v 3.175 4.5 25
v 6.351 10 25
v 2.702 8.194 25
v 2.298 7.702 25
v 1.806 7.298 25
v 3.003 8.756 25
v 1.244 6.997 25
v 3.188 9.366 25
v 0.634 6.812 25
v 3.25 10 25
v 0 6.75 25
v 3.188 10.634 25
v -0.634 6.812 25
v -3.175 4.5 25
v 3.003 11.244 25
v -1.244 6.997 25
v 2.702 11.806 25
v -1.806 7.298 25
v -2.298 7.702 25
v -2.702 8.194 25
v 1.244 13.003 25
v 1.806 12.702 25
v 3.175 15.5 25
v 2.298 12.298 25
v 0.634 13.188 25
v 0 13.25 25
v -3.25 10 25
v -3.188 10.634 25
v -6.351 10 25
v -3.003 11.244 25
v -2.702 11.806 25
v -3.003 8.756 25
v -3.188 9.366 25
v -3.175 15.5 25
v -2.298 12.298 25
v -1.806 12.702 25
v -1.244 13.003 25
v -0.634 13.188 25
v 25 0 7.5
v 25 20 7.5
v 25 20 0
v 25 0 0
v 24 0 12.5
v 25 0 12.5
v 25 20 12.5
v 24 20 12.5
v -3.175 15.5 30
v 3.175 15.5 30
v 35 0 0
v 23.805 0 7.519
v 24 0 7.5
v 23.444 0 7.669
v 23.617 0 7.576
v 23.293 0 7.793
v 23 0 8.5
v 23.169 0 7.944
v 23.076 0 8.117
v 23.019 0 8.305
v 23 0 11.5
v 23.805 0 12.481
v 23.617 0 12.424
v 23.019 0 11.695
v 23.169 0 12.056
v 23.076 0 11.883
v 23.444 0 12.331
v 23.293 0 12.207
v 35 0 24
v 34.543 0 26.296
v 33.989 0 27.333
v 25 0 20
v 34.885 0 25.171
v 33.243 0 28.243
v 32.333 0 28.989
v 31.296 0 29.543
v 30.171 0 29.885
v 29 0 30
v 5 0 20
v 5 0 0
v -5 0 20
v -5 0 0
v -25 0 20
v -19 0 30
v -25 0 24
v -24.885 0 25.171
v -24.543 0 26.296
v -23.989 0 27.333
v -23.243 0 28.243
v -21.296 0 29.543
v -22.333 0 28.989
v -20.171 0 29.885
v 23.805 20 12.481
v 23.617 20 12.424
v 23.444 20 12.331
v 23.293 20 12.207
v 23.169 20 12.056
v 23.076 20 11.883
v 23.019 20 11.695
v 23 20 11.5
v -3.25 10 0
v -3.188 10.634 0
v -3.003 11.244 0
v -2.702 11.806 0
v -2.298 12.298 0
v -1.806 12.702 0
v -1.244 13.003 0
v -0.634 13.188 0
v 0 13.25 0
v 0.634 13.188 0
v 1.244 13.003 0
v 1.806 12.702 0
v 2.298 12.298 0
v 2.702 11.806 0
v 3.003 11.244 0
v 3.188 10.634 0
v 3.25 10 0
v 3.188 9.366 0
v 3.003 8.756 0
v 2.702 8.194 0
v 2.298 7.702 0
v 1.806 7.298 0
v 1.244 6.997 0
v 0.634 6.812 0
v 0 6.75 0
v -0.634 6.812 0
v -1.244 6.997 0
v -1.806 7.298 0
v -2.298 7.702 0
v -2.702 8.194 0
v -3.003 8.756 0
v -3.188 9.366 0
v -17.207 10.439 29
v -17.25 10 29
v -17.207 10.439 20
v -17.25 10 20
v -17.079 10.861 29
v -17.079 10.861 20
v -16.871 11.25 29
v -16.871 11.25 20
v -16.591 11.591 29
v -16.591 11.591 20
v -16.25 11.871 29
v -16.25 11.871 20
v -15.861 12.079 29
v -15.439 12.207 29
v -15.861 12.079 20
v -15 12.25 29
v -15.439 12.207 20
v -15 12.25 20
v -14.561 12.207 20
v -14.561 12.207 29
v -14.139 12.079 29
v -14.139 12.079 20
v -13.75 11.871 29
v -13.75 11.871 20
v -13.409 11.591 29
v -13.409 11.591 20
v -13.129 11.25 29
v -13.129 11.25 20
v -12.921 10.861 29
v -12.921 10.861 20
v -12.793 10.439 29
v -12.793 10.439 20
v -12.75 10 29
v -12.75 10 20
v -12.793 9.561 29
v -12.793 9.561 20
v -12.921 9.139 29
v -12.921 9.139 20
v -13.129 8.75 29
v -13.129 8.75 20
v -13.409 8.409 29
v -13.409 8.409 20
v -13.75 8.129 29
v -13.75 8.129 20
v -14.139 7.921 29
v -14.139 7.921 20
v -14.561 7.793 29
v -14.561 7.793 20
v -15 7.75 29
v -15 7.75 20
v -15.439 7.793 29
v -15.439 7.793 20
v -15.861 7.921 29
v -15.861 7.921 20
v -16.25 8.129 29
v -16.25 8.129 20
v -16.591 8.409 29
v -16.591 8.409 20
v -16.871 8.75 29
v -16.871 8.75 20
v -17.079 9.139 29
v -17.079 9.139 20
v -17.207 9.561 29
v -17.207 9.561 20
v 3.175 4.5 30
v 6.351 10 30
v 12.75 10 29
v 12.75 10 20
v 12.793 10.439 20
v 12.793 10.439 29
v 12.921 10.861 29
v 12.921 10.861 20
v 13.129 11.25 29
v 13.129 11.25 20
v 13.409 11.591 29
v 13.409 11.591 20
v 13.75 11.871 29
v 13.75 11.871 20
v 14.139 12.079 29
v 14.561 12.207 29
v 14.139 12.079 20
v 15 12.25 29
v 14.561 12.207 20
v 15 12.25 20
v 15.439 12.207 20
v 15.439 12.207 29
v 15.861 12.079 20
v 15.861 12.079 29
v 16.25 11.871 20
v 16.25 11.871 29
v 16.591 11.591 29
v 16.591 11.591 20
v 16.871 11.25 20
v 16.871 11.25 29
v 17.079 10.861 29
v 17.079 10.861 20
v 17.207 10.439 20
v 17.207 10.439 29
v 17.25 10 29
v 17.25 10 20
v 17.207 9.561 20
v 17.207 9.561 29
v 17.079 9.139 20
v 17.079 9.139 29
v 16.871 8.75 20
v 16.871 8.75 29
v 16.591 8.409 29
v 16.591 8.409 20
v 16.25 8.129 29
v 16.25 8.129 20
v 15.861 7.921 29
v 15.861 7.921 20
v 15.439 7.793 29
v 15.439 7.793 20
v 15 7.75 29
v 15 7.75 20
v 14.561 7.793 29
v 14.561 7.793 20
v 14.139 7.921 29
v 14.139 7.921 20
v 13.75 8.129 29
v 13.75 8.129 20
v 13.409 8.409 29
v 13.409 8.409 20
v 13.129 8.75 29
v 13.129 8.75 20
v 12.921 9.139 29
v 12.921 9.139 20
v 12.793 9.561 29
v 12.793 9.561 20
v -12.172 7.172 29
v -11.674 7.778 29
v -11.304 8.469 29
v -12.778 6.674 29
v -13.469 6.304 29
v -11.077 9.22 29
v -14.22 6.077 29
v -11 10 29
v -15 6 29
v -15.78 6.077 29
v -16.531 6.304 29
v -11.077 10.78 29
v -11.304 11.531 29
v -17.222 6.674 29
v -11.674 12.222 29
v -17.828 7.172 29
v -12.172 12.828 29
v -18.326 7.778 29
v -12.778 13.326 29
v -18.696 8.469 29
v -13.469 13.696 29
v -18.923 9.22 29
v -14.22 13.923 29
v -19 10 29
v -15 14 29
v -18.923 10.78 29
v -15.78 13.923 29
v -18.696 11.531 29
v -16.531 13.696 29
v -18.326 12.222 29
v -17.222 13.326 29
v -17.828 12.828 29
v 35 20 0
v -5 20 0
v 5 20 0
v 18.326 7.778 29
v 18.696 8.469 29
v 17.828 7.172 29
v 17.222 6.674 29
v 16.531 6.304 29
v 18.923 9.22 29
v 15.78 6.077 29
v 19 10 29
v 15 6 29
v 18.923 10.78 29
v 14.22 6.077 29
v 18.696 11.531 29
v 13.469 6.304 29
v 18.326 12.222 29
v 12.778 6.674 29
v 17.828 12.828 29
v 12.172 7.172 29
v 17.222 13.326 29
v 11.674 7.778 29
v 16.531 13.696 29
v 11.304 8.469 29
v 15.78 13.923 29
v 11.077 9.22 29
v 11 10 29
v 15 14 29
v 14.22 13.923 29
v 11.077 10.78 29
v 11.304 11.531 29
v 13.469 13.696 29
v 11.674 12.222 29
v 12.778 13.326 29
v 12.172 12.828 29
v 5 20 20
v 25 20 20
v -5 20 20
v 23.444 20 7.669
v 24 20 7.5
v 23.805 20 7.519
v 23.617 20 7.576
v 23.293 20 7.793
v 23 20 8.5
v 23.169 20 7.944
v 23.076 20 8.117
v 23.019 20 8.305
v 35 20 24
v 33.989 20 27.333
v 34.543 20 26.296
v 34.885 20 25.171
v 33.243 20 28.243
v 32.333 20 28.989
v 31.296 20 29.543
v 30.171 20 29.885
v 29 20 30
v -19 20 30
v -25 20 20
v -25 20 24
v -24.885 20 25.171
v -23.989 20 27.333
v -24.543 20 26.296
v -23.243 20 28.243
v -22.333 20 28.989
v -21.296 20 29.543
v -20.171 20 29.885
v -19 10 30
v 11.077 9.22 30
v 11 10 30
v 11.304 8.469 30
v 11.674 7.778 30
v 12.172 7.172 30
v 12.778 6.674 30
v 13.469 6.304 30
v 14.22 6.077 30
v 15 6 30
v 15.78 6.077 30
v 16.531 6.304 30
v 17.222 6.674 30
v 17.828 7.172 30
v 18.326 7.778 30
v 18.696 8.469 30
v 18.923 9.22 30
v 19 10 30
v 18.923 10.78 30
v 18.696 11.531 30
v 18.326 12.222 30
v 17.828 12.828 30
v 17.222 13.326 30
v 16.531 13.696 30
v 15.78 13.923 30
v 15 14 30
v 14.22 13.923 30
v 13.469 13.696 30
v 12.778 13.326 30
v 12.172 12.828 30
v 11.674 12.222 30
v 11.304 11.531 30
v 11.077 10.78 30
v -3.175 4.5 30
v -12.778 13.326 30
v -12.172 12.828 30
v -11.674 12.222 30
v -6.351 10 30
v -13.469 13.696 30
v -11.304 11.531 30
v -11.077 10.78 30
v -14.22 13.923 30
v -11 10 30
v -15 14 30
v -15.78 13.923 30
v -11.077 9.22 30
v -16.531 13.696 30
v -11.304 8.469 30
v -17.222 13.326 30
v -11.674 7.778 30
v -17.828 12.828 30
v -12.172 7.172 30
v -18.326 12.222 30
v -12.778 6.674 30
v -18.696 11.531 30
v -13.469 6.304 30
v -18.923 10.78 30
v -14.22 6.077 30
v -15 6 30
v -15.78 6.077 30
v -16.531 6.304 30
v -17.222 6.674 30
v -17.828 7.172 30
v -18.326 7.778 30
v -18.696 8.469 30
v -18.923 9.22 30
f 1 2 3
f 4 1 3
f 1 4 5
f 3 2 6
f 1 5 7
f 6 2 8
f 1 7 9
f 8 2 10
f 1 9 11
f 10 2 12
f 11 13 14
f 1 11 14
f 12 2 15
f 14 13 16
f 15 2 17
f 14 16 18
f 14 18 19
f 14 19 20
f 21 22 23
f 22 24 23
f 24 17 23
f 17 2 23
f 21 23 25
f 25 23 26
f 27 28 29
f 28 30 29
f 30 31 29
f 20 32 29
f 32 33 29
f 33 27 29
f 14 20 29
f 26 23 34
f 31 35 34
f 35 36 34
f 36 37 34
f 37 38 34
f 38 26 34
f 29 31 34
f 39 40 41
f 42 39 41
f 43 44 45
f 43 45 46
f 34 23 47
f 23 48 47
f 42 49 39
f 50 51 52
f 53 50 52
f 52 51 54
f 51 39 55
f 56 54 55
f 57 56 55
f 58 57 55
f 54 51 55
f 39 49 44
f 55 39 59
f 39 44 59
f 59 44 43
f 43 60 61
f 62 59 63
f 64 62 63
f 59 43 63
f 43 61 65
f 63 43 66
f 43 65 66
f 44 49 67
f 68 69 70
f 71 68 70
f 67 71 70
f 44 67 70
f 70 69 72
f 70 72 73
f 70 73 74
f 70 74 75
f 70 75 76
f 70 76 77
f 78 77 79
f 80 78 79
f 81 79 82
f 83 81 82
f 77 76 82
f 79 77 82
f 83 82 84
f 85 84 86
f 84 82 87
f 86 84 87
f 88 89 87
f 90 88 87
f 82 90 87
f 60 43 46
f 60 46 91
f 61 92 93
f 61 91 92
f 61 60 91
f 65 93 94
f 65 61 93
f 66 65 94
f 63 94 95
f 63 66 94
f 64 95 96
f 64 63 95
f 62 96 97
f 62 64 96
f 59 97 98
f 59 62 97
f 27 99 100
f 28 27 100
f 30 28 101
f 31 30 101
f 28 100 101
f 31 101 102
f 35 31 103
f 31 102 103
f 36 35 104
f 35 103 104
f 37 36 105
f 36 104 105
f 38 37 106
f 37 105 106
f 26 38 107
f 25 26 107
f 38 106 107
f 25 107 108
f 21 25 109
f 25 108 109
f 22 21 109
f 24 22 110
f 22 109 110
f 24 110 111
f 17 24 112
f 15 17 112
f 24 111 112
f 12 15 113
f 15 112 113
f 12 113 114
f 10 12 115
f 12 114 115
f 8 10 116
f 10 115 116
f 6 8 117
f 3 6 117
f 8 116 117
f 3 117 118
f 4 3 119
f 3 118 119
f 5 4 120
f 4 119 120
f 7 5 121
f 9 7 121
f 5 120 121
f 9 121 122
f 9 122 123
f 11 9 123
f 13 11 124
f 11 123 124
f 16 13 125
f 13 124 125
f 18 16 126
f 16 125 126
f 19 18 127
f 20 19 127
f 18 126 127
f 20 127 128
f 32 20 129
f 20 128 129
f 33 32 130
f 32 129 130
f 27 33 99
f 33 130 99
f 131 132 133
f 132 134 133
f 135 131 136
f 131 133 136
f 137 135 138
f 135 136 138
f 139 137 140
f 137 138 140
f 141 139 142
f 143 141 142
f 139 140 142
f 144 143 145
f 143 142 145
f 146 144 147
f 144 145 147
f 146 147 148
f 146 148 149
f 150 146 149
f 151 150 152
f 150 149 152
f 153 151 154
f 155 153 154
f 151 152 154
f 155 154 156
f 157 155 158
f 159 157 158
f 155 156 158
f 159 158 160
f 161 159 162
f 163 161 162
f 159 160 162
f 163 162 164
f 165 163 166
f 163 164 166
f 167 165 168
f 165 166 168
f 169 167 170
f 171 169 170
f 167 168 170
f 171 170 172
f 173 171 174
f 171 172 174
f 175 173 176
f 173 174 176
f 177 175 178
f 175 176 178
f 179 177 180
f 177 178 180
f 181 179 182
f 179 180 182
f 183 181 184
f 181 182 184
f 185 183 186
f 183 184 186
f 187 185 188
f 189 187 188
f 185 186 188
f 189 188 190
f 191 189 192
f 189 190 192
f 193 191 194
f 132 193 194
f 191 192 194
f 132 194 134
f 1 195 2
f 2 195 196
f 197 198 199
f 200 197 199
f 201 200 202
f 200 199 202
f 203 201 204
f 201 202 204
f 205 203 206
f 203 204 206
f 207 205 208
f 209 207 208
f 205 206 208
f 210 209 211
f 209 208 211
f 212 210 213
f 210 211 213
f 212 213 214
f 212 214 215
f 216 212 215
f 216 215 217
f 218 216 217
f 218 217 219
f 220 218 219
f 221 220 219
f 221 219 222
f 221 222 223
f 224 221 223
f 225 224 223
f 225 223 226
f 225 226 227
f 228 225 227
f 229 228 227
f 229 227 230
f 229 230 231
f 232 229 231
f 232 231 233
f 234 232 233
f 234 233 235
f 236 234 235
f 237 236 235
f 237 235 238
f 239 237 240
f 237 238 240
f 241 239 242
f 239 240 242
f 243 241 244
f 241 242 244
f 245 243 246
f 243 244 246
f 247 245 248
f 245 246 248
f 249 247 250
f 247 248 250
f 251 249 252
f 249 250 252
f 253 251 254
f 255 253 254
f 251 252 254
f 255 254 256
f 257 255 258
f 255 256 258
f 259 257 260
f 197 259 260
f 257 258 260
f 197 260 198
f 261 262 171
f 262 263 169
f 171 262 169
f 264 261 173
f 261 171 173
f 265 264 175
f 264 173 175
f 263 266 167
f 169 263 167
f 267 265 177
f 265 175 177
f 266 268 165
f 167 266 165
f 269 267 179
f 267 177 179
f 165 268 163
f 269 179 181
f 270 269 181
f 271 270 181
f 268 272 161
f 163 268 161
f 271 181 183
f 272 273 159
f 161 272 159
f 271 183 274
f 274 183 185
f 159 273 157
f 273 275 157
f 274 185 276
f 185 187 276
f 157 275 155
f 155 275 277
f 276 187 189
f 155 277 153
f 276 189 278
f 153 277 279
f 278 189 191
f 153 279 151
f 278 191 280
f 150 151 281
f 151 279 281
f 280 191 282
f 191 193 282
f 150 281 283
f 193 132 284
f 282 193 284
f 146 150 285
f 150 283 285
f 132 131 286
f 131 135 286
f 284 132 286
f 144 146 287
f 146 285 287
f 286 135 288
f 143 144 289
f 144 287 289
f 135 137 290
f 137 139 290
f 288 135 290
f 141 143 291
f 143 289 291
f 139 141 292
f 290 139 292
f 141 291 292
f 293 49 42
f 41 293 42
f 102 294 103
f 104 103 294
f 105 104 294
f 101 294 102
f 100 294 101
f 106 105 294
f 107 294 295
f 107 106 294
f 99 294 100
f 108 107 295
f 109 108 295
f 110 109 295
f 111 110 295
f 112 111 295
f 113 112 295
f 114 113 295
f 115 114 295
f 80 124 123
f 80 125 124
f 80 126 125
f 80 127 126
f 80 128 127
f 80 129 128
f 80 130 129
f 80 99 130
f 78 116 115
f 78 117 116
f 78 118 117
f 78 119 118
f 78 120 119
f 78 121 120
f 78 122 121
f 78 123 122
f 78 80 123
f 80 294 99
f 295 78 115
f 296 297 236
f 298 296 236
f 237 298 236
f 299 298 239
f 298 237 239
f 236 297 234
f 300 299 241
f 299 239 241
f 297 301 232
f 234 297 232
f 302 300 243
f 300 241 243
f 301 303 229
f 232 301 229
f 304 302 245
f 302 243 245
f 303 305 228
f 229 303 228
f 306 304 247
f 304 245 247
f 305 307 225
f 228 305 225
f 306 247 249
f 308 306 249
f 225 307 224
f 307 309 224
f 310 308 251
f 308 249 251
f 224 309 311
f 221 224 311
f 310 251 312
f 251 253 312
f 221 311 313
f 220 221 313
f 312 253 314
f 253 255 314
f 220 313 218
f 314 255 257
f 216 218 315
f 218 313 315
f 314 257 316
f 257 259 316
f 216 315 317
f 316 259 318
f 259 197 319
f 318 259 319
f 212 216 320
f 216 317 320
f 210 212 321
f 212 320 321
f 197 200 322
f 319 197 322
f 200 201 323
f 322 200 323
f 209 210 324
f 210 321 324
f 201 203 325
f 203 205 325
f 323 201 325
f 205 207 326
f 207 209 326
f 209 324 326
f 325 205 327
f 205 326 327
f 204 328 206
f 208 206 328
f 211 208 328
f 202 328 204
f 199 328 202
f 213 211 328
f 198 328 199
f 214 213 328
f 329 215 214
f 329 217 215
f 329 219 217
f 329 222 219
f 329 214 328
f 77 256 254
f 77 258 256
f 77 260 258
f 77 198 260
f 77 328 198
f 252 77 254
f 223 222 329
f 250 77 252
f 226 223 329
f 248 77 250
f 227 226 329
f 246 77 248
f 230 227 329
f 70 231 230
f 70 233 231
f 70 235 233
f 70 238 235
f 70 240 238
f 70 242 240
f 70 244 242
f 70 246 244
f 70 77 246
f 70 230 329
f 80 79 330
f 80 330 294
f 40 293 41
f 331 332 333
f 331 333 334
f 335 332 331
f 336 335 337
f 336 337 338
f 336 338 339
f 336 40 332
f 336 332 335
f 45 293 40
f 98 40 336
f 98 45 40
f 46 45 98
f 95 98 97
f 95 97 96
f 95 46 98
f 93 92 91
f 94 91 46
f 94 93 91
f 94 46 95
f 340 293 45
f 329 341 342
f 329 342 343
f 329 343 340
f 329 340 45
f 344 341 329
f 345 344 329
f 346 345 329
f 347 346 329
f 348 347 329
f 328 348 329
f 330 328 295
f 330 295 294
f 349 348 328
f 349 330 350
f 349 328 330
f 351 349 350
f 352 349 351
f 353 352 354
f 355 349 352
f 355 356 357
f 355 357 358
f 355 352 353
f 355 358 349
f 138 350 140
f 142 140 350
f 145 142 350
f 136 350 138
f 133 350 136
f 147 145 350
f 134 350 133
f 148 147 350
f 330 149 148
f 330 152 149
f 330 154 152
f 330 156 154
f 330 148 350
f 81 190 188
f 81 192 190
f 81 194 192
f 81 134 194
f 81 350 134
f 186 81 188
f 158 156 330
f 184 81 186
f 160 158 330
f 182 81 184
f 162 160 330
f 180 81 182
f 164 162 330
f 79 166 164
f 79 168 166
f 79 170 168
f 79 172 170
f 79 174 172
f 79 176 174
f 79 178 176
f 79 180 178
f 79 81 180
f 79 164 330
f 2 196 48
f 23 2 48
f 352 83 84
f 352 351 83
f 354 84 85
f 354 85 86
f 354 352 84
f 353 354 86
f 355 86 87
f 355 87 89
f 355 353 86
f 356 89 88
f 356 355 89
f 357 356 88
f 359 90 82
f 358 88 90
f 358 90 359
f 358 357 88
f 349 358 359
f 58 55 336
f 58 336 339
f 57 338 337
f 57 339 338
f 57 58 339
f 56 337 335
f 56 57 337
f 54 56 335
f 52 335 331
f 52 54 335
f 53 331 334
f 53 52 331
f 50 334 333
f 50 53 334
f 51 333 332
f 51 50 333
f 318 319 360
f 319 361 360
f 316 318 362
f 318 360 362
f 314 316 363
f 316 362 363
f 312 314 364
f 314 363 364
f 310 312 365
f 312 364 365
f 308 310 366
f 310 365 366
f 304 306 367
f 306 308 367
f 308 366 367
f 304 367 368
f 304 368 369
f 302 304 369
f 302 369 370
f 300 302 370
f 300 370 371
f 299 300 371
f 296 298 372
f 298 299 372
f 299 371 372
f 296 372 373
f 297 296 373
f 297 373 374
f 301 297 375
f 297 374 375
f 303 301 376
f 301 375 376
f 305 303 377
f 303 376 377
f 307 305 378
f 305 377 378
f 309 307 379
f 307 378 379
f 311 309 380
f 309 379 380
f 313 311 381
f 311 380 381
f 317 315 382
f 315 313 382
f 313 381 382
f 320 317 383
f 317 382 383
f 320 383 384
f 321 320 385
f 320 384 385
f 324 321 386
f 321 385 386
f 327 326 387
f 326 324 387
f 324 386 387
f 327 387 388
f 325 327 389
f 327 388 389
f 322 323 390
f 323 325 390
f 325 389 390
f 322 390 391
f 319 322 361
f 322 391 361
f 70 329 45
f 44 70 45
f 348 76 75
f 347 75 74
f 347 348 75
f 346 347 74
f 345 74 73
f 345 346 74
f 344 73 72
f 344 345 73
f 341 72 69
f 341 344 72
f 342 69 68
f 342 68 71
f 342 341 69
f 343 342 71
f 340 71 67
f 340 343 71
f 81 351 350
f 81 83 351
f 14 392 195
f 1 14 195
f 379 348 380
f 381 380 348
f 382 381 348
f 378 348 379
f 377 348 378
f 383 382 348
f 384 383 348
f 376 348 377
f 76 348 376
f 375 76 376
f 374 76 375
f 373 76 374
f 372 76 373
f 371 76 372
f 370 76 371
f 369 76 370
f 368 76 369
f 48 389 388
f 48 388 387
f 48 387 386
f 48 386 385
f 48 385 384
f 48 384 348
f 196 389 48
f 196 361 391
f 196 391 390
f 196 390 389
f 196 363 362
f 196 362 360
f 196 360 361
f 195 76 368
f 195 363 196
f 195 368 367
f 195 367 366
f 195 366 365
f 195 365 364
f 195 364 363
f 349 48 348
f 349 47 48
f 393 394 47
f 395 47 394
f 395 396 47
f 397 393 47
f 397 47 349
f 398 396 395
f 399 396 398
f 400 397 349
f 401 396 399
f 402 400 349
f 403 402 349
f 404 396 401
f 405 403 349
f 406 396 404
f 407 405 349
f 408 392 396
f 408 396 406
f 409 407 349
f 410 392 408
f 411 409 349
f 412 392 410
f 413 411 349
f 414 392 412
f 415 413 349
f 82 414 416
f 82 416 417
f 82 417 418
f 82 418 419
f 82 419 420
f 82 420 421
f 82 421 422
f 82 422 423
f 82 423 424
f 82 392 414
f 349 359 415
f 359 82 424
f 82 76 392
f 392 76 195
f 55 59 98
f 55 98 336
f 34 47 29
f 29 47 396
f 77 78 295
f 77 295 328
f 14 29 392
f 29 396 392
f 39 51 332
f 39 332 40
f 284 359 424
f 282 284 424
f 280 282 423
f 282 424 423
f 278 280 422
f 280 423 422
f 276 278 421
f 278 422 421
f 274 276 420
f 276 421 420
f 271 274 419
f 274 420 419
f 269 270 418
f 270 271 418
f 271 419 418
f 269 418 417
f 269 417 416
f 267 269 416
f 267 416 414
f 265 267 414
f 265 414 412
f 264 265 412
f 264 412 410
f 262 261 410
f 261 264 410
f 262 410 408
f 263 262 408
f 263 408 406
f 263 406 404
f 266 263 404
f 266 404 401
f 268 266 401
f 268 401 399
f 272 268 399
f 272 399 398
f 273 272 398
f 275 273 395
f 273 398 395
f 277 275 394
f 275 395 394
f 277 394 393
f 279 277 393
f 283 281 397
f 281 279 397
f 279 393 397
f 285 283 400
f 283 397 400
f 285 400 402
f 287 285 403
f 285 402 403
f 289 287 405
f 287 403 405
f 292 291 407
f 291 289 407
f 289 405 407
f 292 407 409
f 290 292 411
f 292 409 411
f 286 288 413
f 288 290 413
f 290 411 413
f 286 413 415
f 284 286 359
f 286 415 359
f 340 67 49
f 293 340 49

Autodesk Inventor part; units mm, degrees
ref_plane "YZ Plane" through (0, 0, 0) normal (1, 0, 0) x (0, 1, 0)
ref_plane "XZ Plane" through (0, 0, 0) normal (0, 1, 0) x (-1, 0, 0)
ref_plane "XY Plane" through (0, 0, 0) normal (0, 0, 1) x (1, 0, 0)
sketch "Szkic1" plane through (0, 0, 0) normal (0, 1, 0) x (-1, 0, 0)
  line L0 (25, 20) -> (5, 20)
  line L1 (5, 20) -> (5, 0)
  line L2 (5, 0) -> (25, 0)
  line L3 (25, 0) -> (25, 20)
  line L4 (-5, 20) -> (-25, 20)
  line L5 (-25, 20) -> (-25, 0)
  line L6 (-25, 0) -> (-5, 0)
  line L7 (-5, 0) -> (-5, 20)
  line L8 (25, 0) -> (-25, 0)
  line L9 (-25, 0) -> (-25, 30)
  line L10 (-25, 30) -> (25, 30)
  line L11 (25, 30) -> (25, 0)
  line L12 (-25, 30) -> (-35, 30)
  line L13 (-35, 30) -> (-35, 0)
  line L14 (-35, 0) -> (-25, 0)
  line L15 (-25, 0) -> (-25, 30)
  line L16 (-25, 12.5) -> (-24, 12.5)
  line L17 (-23, 11.5) -> (-23, 8.5)
  line L18 (-24, 7.5) -> (-25, 7.5)
  line L19 (-25, 7.5) -> (-25, 12.5)
  arc A0 (-23, 11.5) -> (-24, 12.5) centre (-24, 11.5) ccw
  arc A1 (-24, 7.5) -> (-23, 8.5) centre (-24, 8.5) ccw
  point P0 (0, 0)
  point P1 (-15, 20)
  point P2 (15, 20)
  point P3 (15, 0)
  point P4 (-5, 0)
  point P5 (5, 0)
  point P6 (-23, 7.5)
  point P7 (-23, 12.5)
  dimension "d0" = 20
  dimension "d1" = 20
  dimension "d2" = 20
  dimension "d3" = 20
  dimension "d4" = 50
  dimension "d5" = 25
  dimension "d6" = 10
  dimension "d28" = 10
  dimension "d29" = 5
  dimension "d30" = 7.5
  dimension "d31" = 2
  dimension "d33" = 1
extrude "Wyciągnięcie proste1" add sketch "Szkic1" along normal blind 20 contours L0 L1 L8 L7 L4 L9 L10 L11 | L9 L5 L14 L13 L12 | L16 A0 L17 A1 L18 L5
sketch "Szkic2" plane through (5, 0, 0) normal (0, 0, -1) x (-1, 0, 0)
  circle A0 centre (5, 10) radius 3.25
  circle A1 centre (20, 10) radius 2.25
  circle A2 centre (-10, 10) radius 2.25
  line L0 (0, 0) -> (0, 20) projected
  line L1 (0, 0) -> (10, 0) projected
  line L2 (-20, 0) -> (0, 0) projected
  line L3 (30, 0) -> (30, 20) projected
  circle A3 centre (-10, 10) radius 4
  circle A4 centre (20, 10) radius 4
  line L4 (1.8246, 15.5) -> (8.1754, 15.5)
  line L5 (8.1754, 15.5) -> (11.3509, 10)
  line L6 (11.3509, 10) -> (8.1754, 4.5)
  line L7 (8.1754, 4.5) -> (1.8246, 4.5)
  line L8 (1.8246, 4.5) -> (-1.3509, 10)
  line L9 (-1.3509, 10) -> (1.8246, 15.5)
  line L10 (-20, 0) -> (-20, 20) projected
  point P0 (5, 0)
  dimension "d9" = 6.5
  dimension "d10" = 5
  dimension "d11" = 10
  dimension "d13" = 10
  dimension "d14" = 10
  dimension "d15" = 4.5
  dimension "d16" = 4.5
  dimension "d20" = 8
  dimension "d21" = 8
  dimension "d25" = 11
  dimension "d32" = 10
extrude "Wyciągnięcie proste2" cut sketch "Szkic2" against normal through all contours A0 | A1 | A2
extrude "Wyciągnięcie proste3" cut sketch "Szkic2" along normal blind 5 from surface at -30 contours A0 | L8 L9 L0 | L0 L9 L4 L5 L6 L7 L8
fillet "Zaokrąglenie1" radius 6 2 edges at (-25, 10, 30) (35, 10, 30)
extrude "Wyciągnięcie proste4" cut sketch "Szkic2" along normal blind 1 from surface at -30 contours A1 | A2 | A3 | A4
properties part number "ZItemMountCable" material "Tworzywo sztuczne ABS"
